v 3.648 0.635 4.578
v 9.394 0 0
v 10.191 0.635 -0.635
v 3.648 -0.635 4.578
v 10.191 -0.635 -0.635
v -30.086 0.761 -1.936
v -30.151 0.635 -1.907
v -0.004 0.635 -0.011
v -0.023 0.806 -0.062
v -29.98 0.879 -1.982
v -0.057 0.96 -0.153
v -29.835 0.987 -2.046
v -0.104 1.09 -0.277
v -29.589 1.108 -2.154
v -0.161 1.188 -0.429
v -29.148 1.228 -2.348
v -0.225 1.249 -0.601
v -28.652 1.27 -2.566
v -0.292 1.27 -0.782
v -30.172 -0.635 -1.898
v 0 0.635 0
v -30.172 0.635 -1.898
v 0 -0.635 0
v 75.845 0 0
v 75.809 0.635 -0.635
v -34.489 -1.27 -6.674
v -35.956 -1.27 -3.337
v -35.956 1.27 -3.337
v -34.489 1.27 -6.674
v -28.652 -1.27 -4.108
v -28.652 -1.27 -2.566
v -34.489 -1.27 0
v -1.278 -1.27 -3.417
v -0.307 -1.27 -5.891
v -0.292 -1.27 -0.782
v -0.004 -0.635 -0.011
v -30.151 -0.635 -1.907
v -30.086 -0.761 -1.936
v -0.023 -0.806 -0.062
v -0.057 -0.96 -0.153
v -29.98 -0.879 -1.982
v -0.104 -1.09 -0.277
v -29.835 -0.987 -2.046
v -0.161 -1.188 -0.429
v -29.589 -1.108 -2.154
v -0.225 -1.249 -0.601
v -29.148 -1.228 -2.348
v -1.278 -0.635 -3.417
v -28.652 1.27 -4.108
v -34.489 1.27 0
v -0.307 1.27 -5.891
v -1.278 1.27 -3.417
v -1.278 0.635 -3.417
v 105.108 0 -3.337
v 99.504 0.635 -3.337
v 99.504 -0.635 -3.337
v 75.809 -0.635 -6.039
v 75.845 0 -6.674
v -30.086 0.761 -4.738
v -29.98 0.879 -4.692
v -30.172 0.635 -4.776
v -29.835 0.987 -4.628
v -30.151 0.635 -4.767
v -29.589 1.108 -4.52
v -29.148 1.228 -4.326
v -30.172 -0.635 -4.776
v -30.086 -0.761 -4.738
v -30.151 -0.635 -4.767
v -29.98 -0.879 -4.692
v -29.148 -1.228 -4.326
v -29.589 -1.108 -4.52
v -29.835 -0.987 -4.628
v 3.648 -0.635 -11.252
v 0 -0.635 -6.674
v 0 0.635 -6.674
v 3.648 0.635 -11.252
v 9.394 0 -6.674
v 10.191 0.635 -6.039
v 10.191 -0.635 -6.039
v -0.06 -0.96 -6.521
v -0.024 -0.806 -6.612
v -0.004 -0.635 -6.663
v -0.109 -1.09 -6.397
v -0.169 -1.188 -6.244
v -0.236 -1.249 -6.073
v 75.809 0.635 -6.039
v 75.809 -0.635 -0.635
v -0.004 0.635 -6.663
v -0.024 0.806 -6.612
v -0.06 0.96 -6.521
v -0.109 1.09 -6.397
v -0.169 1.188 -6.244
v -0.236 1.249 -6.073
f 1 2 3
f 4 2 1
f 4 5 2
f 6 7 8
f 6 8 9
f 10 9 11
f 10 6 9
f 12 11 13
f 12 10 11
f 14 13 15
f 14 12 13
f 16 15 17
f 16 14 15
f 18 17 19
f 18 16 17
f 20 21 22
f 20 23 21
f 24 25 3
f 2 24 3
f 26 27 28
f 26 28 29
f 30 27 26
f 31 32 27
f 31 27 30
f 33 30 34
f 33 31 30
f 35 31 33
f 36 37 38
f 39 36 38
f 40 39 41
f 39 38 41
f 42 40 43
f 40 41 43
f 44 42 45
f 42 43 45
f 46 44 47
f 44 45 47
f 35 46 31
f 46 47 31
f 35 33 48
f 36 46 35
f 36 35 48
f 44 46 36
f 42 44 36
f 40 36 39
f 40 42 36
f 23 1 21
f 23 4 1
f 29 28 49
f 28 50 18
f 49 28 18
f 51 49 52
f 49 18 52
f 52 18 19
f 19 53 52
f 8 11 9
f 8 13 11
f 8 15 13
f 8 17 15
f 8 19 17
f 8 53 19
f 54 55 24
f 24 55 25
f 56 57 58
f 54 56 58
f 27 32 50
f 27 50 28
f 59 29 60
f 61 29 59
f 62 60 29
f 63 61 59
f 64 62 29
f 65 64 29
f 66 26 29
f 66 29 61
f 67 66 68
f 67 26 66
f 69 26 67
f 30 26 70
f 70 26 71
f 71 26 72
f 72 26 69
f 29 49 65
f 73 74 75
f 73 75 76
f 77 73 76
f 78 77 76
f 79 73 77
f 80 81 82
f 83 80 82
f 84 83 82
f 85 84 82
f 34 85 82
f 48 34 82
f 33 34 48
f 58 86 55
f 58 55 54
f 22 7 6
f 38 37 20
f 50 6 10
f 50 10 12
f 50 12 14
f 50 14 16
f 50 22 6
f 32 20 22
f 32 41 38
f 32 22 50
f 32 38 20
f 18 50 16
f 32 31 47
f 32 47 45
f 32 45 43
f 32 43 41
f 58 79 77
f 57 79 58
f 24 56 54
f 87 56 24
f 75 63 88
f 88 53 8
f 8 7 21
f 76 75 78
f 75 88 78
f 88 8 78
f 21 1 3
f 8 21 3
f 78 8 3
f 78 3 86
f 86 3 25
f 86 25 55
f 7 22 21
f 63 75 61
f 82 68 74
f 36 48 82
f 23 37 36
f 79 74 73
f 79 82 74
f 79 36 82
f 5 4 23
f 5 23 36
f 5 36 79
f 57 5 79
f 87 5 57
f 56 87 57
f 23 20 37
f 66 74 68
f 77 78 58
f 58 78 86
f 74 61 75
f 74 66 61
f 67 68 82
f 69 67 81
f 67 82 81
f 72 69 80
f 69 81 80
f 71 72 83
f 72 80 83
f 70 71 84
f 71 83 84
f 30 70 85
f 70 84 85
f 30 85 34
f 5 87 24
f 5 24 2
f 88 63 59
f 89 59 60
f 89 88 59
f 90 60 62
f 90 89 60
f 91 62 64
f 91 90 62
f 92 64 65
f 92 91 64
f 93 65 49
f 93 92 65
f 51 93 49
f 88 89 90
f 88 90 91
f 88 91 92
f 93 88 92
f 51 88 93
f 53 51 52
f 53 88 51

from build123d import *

# Parameters (mm, degrees)
F1_DEPTH = 1.27
F2_R     = 0.762
F3_DEPTH = 0.635
F4_SIZE  = 0.63499


# Not quite as in the source:
# - a fillet or chamfer is up to 0.001 mm smaller than in the source, because OpenCascade refuses the exact size


with BuildPart() as f1:
    # F0 (on Front) → F1 (new body, symmetric)
    with BuildSketch(Plane.XZ):
        Polygon((-30.9530049562, -3.3370526507), (-30.1719289273, -1.8979058368), (-34.4893708825, 0), (-35.9563070381, -3.3370526507), align=None)
        Polygon((-30.1719289273, -4.7761994647), (-30.9530049562, -3.3370526507), (-35.9563070381, -3.3370526507), (-34.4893708825, -6.6741053015), align=None)
        Polygon((-1.278280112, -3.4174603466), (0, 0), (-30.1719289273, -1.8979058368), (-30.9530049562, -3.3370526507), align=None)
        Polygon((0, -6.6741053015), (-1.278280112, -3.4174603466), (-30.9530049562, -3.3370526507), (-30.1719289273, -4.7761994647), align=None)
    extrude(amount=F1_DEPTH, both=True)

    # F2
    f2_edges = [f1.edges().sort_by_distance(p)[0] for p in [
        (-15.085964, -1.27, -0.948953),
        (-15.085964, 1.27, -0.948953),
        (-15.085964, 1.27, -5.725152),
        (-15.085964, -1.27, -5.725152),
    ]]
    fillet(f2_edges, radius=F2_R)

    # F0 (on Front) → F3 (join, symmetric)
    with BuildSketch(Plane.XZ):
        Polygon((-1.278280112, -3.4174603466), (0, 0), (-30.1719289273, -1.8979058368), (-30.9530049562, -3.3370526507), align=None)
        Polygon((3.6480247509, 4.5782560483), (0, 0), (-1.278280112, -3.4174603466), (105.1078885794, -3.3370526507), (75.8452340961, 0), (9.3937172488, 0), align=None)
        Polygon((-30.9530049562, -3.3370526507), (-30.1719289273, -1.8979058368), (-34.4893708825, 0), (-35.9563070381, -3.3370526507), align=None)
        Polygon((105.1078885794, -3.3370526507), (-1.278280112, -3.4174603466), (0, -6.6741053015), (3.6480247509, -11.2523613498), (9.3937172488, -6.6741053015), (75.8452340961, -6.6741053015), align=None)
        Polygon((0, -6.6741053015), (-1.278280112, -3.4174603466), (-30.9530049562, -3.3370526507), (-30.1719289273, -4.7761994647), align=None)
        Polygon((-30.1719289273, -4.7761994647), (-30.9530049562, -3.3370526507), (-35.9563070381, -3.3370526507), (-34.4893708825, -6.6741053015), align=None)
    extrude(amount=F3_DEPTH, both=True)

    # F4 (size 0.635 in the source; OpenCascade refuses exactly that, so slightly less here)
    f4_edges = [f1.edges().sort_by_distance(p)[0] for p in [
        (42.619476, -0.635, -6.674105),
        (42.619476, 0.635, -6.674105),
        (42.619476, -0.635, 0),
        (42.619476, 0.635, 0),
        (90.476561, -0.635, -1.668526),
        (90.476561, 0.635, -1.668526),
        (90.476561, -0.635, -5.005579),
        (90.476561, 0.635, -5.005579),
    ]]
    chamfer(f4_edges, length=F4_SIZE)


solid = f1.part
